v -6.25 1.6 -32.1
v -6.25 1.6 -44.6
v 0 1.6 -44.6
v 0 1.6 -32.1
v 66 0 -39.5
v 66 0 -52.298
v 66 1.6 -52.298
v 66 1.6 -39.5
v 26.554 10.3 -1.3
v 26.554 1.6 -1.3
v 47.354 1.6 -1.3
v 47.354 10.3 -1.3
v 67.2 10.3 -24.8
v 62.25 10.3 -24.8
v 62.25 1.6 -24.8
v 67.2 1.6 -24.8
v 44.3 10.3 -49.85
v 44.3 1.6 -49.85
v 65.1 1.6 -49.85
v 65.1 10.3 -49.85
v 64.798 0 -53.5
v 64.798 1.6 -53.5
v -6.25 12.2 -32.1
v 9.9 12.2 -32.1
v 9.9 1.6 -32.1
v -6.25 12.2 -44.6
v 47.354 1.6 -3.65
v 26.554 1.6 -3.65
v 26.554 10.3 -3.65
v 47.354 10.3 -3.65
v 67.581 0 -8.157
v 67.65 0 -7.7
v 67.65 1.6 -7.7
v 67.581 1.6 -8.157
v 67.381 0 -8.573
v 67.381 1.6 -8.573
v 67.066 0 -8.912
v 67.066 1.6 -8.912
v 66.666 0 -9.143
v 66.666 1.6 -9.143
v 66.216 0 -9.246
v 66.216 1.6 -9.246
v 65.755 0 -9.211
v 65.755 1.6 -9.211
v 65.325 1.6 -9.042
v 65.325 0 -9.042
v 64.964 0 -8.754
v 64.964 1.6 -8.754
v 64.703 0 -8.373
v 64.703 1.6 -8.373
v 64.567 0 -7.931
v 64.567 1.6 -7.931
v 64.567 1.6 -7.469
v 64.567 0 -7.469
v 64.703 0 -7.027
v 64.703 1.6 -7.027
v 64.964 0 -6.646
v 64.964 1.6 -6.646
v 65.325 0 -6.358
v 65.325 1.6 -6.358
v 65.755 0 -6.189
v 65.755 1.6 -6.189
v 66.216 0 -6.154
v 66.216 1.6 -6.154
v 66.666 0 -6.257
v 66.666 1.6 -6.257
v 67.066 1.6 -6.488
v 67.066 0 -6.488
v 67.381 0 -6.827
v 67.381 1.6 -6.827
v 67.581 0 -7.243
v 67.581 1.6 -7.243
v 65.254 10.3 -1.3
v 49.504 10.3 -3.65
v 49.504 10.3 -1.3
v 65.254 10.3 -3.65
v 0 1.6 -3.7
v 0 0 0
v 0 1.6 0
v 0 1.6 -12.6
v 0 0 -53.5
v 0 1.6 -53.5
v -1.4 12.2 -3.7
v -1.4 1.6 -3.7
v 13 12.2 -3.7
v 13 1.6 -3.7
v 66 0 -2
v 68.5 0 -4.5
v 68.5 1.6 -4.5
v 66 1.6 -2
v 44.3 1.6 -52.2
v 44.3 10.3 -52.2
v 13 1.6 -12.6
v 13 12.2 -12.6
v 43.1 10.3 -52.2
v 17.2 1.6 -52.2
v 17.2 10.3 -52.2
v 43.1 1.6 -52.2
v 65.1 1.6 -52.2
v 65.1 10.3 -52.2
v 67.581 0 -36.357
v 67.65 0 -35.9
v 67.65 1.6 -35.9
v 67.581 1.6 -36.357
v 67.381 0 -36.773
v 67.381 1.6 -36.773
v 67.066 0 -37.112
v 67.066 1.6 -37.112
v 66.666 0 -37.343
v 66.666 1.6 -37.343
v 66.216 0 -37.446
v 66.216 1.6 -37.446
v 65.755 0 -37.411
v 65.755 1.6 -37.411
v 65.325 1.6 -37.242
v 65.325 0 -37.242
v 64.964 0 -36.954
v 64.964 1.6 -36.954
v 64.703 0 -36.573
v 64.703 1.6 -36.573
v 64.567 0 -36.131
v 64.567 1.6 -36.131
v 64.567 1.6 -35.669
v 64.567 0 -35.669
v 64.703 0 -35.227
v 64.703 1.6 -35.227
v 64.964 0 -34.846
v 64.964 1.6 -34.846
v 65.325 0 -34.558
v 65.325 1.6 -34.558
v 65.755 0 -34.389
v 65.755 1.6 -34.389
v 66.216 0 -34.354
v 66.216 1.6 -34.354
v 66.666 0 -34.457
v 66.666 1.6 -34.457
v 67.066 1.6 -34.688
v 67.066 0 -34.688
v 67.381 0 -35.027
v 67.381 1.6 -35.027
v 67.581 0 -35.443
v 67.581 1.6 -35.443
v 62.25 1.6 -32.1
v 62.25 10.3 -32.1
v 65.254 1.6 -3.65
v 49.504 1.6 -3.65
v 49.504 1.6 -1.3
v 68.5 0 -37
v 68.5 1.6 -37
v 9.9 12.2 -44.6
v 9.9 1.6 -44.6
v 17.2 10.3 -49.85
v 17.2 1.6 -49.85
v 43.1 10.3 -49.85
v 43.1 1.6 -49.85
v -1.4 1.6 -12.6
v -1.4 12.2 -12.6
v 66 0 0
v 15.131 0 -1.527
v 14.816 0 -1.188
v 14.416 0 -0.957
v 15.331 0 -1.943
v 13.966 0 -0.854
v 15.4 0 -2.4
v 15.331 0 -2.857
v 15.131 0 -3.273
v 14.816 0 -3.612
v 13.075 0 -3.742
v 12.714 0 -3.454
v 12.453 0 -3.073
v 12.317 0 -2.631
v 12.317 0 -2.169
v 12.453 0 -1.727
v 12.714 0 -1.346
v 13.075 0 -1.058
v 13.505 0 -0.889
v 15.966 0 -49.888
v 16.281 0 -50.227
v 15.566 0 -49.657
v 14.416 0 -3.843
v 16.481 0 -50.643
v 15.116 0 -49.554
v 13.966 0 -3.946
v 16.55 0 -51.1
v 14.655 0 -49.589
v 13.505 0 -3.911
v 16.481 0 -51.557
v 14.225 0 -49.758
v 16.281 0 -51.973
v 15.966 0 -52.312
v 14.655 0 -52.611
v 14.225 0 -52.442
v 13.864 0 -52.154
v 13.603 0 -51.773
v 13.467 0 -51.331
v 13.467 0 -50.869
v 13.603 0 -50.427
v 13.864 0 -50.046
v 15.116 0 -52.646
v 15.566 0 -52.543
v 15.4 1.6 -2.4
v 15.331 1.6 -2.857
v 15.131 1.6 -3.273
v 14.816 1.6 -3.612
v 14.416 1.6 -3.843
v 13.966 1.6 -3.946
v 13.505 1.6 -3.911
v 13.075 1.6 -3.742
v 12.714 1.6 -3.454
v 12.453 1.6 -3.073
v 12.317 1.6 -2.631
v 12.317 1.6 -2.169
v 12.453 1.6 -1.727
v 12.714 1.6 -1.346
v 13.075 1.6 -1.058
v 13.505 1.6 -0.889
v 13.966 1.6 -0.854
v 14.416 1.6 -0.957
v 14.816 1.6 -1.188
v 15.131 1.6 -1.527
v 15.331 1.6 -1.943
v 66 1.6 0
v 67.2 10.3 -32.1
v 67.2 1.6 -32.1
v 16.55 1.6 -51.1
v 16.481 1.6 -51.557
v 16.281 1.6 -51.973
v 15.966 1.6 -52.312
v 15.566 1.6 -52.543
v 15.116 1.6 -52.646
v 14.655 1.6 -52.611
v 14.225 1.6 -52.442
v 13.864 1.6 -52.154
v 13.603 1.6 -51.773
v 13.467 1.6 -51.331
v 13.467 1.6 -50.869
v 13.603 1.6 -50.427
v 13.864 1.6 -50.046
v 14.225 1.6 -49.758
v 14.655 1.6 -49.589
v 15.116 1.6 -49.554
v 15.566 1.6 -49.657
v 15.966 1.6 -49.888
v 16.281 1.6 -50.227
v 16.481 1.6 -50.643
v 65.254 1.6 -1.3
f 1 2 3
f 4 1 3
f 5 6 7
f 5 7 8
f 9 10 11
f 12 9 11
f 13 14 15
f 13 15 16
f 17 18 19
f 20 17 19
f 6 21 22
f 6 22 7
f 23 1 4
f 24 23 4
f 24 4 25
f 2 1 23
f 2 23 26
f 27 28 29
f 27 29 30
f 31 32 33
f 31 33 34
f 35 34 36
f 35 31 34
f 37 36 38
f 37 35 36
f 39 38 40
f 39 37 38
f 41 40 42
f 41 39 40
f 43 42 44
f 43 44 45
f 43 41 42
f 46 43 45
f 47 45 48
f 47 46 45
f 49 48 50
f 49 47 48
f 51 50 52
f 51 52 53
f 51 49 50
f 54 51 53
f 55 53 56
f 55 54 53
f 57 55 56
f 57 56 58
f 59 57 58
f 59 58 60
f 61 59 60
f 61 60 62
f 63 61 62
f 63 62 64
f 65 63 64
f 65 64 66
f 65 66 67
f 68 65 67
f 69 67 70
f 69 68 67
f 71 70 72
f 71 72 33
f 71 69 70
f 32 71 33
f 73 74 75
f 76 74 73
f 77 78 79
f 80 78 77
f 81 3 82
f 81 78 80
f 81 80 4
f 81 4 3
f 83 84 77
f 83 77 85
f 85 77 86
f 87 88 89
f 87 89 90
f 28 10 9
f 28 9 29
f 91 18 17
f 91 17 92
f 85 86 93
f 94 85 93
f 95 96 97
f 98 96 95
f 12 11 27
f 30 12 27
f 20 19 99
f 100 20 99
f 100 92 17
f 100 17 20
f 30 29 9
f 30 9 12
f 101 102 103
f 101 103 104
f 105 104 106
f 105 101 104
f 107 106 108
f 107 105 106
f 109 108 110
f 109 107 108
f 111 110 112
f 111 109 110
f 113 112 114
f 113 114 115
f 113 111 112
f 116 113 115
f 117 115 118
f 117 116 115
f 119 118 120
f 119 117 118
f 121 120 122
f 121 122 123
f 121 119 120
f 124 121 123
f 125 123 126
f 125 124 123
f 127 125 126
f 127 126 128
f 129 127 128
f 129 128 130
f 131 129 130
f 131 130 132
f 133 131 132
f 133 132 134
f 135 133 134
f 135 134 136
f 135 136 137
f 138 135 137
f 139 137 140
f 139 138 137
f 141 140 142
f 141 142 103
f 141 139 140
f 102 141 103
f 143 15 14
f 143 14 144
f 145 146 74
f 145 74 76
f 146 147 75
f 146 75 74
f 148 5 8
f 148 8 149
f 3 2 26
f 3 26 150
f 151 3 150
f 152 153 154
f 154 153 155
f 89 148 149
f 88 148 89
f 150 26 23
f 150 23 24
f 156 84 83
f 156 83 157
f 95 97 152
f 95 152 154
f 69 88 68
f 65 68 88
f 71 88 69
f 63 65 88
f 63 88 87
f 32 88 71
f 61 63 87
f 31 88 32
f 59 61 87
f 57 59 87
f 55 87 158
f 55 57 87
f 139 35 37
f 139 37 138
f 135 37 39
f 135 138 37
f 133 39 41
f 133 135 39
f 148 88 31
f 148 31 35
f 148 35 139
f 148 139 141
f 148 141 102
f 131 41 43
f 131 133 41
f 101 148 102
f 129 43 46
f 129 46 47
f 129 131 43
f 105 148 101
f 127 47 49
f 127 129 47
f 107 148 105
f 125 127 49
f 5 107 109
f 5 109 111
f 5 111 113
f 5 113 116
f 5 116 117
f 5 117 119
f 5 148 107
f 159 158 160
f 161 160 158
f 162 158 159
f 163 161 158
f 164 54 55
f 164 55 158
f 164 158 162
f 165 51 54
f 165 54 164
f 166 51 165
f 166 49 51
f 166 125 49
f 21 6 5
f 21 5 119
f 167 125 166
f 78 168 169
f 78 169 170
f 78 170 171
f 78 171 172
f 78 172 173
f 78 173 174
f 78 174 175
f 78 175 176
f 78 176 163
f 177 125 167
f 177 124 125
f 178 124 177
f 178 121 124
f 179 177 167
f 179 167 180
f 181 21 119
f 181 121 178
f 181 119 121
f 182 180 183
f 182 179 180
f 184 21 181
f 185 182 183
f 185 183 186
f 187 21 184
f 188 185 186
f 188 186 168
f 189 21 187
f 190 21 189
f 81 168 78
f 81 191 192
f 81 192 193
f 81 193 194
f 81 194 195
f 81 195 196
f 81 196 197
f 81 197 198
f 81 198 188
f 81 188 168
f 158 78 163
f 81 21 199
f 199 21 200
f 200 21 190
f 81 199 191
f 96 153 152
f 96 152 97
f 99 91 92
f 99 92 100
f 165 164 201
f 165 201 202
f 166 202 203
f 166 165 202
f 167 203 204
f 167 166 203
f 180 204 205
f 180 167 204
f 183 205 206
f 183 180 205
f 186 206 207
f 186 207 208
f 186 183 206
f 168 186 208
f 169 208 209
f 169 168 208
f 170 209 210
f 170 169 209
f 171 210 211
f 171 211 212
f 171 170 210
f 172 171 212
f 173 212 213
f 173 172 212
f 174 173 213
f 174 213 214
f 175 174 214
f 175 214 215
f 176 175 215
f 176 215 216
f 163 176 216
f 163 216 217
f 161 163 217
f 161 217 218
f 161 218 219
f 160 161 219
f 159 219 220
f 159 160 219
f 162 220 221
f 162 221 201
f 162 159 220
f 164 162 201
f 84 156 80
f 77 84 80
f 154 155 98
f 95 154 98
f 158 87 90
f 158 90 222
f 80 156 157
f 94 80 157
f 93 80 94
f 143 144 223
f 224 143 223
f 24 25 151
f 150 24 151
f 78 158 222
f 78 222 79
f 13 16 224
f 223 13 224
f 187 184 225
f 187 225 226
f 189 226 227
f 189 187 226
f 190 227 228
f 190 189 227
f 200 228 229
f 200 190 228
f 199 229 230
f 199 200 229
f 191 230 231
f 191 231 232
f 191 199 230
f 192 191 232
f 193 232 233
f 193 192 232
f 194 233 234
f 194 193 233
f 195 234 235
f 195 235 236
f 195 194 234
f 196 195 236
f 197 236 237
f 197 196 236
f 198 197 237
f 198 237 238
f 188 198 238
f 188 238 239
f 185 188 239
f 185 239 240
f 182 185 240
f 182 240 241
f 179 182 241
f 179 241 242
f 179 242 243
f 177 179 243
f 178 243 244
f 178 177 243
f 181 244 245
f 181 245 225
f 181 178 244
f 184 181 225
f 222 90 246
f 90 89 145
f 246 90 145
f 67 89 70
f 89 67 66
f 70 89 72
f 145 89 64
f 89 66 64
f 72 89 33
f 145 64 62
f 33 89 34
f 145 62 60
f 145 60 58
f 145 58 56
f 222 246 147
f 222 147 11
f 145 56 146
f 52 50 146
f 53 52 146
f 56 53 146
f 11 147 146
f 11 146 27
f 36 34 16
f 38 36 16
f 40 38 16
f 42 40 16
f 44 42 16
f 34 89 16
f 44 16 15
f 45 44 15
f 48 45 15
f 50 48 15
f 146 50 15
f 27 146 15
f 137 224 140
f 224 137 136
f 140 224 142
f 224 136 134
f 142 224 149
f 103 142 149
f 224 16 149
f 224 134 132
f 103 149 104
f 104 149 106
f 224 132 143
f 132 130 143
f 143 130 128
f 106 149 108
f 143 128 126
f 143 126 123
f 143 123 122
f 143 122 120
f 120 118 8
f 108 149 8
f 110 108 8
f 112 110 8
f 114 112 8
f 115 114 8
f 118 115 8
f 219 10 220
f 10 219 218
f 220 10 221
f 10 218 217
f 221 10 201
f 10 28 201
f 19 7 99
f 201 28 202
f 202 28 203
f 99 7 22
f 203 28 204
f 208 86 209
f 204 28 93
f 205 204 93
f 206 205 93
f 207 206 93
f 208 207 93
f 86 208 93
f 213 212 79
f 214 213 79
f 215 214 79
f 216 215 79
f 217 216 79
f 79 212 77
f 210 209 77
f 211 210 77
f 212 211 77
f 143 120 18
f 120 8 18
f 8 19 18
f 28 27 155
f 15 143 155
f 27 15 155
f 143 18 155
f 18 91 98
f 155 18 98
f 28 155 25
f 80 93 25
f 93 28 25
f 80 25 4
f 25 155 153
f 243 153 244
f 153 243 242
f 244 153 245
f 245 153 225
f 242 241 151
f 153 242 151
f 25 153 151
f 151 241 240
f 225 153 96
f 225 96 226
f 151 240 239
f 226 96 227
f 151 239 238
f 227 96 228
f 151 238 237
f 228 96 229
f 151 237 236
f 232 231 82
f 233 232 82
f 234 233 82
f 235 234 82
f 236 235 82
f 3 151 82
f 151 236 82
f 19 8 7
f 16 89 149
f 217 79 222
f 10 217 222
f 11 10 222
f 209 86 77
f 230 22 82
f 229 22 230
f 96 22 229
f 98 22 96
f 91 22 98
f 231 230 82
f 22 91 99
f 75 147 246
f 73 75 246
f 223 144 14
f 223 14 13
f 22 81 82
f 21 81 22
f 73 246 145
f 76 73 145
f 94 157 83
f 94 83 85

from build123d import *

# Parameters (mm, degrees)
SKETCH1_R           = 1.55
BOSS_EXTRUDE1_DEPTH = 1.6
SKETCH2_W           = 25.9
SKETCH2_H           = 2.35
SKETCH2_W_2         = 20.8
SKETCH2_W_3         = 15.75
SKETCH2_W_4         = 4.95
SKETCH2_H_2         = 7.3
BOSS_EXTRUDE2_DEPTH = 8.7
SKETCH3_W           = 16.15
SKETCH3_H           = 12.5
SKETCH3_W_2         = 14.4
SKETCH3_H_2         = 8.9
BOSS_EXTRUDE3_DEPTH = 10.6


with BuildPart() as part:
    # Sketch1 → Boss-Extrude1 (new body)
    with BuildSketch(Plane(origin=(0, 0, 0), x_dir=(1, 0, 0), z_dir=(0, 1, 0))):
        Polygon((66, 52.297918472), (66, 39.5), (68.5, 37), (68.5, 4.5), (66, 2), (66, 0), (0, 0), (0, 53.5), (64.797918472, 53.5), align=None)
        with Locations((15, 51.1)):
            Circle(SKETCH1_R, mode=Mode.SUBTRACT)
        with Locations((66.1, 35.9)):
            Circle(SKETCH1_R, mode=Mode.SUBTRACT)
        with Locations((66.1, 7.7)):
            Circle(SKETCH1_R, mode=Mode.SUBTRACT)
        with Locations((13.85, 2.4)):
            Circle(SKETCH1_R, mode=Mode.SUBTRACT)
    extrude(amount=BOSS_EXTRUDE1_DEPTH)

    # Sketch2 → Boss-Extrude2 (add)
    with BuildSketch(Plane(origin=(0, 1.6, 0), x_dir=(1, 0, 0), z_dir=(0, 1, 0))):
        with Locations((30.15, 51.025)):
            Rectangle(SKETCH2_W, SKETCH2_H)
        with Locations((54.7, 51.025)):
            Rectangle(SKETCH2_W_2, SKETCH2_H)
        with Locations((57.378669226, 2.475)):
            Rectangle(SKETCH2_W_3, SKETCH2_H)
        with Locations((36.953669226, 2.475)):
            Rectangle(SKETCH2_W_2, SKETCH2_H)
        with Locations((64.725, 28.45)):
            Rectangle(SKETCH2_W_4, SKETCH2_H_2)
    extrude(amount=BOSS_EXTRUDE2_DEPTH)

    # Sketch3 → Boss-Extrude3 (add)
    with BuildSketch(Plane(origin=(0, 1.6, 0), x_dir=(1, 0, 0), z_dir=(0, 1, 0))):
        with Locations((1.825, 38.35)):
            Rectangle(SKETCH3_W, SKETCH3_H)
        with Locations((5.8, 8.15)):
            Rectangle(SKETCH3_W_2, SKETCH3_H_2)
    extrude(amount=BOSS_EXTRUDE3_DEPTH)


solid = part.part
